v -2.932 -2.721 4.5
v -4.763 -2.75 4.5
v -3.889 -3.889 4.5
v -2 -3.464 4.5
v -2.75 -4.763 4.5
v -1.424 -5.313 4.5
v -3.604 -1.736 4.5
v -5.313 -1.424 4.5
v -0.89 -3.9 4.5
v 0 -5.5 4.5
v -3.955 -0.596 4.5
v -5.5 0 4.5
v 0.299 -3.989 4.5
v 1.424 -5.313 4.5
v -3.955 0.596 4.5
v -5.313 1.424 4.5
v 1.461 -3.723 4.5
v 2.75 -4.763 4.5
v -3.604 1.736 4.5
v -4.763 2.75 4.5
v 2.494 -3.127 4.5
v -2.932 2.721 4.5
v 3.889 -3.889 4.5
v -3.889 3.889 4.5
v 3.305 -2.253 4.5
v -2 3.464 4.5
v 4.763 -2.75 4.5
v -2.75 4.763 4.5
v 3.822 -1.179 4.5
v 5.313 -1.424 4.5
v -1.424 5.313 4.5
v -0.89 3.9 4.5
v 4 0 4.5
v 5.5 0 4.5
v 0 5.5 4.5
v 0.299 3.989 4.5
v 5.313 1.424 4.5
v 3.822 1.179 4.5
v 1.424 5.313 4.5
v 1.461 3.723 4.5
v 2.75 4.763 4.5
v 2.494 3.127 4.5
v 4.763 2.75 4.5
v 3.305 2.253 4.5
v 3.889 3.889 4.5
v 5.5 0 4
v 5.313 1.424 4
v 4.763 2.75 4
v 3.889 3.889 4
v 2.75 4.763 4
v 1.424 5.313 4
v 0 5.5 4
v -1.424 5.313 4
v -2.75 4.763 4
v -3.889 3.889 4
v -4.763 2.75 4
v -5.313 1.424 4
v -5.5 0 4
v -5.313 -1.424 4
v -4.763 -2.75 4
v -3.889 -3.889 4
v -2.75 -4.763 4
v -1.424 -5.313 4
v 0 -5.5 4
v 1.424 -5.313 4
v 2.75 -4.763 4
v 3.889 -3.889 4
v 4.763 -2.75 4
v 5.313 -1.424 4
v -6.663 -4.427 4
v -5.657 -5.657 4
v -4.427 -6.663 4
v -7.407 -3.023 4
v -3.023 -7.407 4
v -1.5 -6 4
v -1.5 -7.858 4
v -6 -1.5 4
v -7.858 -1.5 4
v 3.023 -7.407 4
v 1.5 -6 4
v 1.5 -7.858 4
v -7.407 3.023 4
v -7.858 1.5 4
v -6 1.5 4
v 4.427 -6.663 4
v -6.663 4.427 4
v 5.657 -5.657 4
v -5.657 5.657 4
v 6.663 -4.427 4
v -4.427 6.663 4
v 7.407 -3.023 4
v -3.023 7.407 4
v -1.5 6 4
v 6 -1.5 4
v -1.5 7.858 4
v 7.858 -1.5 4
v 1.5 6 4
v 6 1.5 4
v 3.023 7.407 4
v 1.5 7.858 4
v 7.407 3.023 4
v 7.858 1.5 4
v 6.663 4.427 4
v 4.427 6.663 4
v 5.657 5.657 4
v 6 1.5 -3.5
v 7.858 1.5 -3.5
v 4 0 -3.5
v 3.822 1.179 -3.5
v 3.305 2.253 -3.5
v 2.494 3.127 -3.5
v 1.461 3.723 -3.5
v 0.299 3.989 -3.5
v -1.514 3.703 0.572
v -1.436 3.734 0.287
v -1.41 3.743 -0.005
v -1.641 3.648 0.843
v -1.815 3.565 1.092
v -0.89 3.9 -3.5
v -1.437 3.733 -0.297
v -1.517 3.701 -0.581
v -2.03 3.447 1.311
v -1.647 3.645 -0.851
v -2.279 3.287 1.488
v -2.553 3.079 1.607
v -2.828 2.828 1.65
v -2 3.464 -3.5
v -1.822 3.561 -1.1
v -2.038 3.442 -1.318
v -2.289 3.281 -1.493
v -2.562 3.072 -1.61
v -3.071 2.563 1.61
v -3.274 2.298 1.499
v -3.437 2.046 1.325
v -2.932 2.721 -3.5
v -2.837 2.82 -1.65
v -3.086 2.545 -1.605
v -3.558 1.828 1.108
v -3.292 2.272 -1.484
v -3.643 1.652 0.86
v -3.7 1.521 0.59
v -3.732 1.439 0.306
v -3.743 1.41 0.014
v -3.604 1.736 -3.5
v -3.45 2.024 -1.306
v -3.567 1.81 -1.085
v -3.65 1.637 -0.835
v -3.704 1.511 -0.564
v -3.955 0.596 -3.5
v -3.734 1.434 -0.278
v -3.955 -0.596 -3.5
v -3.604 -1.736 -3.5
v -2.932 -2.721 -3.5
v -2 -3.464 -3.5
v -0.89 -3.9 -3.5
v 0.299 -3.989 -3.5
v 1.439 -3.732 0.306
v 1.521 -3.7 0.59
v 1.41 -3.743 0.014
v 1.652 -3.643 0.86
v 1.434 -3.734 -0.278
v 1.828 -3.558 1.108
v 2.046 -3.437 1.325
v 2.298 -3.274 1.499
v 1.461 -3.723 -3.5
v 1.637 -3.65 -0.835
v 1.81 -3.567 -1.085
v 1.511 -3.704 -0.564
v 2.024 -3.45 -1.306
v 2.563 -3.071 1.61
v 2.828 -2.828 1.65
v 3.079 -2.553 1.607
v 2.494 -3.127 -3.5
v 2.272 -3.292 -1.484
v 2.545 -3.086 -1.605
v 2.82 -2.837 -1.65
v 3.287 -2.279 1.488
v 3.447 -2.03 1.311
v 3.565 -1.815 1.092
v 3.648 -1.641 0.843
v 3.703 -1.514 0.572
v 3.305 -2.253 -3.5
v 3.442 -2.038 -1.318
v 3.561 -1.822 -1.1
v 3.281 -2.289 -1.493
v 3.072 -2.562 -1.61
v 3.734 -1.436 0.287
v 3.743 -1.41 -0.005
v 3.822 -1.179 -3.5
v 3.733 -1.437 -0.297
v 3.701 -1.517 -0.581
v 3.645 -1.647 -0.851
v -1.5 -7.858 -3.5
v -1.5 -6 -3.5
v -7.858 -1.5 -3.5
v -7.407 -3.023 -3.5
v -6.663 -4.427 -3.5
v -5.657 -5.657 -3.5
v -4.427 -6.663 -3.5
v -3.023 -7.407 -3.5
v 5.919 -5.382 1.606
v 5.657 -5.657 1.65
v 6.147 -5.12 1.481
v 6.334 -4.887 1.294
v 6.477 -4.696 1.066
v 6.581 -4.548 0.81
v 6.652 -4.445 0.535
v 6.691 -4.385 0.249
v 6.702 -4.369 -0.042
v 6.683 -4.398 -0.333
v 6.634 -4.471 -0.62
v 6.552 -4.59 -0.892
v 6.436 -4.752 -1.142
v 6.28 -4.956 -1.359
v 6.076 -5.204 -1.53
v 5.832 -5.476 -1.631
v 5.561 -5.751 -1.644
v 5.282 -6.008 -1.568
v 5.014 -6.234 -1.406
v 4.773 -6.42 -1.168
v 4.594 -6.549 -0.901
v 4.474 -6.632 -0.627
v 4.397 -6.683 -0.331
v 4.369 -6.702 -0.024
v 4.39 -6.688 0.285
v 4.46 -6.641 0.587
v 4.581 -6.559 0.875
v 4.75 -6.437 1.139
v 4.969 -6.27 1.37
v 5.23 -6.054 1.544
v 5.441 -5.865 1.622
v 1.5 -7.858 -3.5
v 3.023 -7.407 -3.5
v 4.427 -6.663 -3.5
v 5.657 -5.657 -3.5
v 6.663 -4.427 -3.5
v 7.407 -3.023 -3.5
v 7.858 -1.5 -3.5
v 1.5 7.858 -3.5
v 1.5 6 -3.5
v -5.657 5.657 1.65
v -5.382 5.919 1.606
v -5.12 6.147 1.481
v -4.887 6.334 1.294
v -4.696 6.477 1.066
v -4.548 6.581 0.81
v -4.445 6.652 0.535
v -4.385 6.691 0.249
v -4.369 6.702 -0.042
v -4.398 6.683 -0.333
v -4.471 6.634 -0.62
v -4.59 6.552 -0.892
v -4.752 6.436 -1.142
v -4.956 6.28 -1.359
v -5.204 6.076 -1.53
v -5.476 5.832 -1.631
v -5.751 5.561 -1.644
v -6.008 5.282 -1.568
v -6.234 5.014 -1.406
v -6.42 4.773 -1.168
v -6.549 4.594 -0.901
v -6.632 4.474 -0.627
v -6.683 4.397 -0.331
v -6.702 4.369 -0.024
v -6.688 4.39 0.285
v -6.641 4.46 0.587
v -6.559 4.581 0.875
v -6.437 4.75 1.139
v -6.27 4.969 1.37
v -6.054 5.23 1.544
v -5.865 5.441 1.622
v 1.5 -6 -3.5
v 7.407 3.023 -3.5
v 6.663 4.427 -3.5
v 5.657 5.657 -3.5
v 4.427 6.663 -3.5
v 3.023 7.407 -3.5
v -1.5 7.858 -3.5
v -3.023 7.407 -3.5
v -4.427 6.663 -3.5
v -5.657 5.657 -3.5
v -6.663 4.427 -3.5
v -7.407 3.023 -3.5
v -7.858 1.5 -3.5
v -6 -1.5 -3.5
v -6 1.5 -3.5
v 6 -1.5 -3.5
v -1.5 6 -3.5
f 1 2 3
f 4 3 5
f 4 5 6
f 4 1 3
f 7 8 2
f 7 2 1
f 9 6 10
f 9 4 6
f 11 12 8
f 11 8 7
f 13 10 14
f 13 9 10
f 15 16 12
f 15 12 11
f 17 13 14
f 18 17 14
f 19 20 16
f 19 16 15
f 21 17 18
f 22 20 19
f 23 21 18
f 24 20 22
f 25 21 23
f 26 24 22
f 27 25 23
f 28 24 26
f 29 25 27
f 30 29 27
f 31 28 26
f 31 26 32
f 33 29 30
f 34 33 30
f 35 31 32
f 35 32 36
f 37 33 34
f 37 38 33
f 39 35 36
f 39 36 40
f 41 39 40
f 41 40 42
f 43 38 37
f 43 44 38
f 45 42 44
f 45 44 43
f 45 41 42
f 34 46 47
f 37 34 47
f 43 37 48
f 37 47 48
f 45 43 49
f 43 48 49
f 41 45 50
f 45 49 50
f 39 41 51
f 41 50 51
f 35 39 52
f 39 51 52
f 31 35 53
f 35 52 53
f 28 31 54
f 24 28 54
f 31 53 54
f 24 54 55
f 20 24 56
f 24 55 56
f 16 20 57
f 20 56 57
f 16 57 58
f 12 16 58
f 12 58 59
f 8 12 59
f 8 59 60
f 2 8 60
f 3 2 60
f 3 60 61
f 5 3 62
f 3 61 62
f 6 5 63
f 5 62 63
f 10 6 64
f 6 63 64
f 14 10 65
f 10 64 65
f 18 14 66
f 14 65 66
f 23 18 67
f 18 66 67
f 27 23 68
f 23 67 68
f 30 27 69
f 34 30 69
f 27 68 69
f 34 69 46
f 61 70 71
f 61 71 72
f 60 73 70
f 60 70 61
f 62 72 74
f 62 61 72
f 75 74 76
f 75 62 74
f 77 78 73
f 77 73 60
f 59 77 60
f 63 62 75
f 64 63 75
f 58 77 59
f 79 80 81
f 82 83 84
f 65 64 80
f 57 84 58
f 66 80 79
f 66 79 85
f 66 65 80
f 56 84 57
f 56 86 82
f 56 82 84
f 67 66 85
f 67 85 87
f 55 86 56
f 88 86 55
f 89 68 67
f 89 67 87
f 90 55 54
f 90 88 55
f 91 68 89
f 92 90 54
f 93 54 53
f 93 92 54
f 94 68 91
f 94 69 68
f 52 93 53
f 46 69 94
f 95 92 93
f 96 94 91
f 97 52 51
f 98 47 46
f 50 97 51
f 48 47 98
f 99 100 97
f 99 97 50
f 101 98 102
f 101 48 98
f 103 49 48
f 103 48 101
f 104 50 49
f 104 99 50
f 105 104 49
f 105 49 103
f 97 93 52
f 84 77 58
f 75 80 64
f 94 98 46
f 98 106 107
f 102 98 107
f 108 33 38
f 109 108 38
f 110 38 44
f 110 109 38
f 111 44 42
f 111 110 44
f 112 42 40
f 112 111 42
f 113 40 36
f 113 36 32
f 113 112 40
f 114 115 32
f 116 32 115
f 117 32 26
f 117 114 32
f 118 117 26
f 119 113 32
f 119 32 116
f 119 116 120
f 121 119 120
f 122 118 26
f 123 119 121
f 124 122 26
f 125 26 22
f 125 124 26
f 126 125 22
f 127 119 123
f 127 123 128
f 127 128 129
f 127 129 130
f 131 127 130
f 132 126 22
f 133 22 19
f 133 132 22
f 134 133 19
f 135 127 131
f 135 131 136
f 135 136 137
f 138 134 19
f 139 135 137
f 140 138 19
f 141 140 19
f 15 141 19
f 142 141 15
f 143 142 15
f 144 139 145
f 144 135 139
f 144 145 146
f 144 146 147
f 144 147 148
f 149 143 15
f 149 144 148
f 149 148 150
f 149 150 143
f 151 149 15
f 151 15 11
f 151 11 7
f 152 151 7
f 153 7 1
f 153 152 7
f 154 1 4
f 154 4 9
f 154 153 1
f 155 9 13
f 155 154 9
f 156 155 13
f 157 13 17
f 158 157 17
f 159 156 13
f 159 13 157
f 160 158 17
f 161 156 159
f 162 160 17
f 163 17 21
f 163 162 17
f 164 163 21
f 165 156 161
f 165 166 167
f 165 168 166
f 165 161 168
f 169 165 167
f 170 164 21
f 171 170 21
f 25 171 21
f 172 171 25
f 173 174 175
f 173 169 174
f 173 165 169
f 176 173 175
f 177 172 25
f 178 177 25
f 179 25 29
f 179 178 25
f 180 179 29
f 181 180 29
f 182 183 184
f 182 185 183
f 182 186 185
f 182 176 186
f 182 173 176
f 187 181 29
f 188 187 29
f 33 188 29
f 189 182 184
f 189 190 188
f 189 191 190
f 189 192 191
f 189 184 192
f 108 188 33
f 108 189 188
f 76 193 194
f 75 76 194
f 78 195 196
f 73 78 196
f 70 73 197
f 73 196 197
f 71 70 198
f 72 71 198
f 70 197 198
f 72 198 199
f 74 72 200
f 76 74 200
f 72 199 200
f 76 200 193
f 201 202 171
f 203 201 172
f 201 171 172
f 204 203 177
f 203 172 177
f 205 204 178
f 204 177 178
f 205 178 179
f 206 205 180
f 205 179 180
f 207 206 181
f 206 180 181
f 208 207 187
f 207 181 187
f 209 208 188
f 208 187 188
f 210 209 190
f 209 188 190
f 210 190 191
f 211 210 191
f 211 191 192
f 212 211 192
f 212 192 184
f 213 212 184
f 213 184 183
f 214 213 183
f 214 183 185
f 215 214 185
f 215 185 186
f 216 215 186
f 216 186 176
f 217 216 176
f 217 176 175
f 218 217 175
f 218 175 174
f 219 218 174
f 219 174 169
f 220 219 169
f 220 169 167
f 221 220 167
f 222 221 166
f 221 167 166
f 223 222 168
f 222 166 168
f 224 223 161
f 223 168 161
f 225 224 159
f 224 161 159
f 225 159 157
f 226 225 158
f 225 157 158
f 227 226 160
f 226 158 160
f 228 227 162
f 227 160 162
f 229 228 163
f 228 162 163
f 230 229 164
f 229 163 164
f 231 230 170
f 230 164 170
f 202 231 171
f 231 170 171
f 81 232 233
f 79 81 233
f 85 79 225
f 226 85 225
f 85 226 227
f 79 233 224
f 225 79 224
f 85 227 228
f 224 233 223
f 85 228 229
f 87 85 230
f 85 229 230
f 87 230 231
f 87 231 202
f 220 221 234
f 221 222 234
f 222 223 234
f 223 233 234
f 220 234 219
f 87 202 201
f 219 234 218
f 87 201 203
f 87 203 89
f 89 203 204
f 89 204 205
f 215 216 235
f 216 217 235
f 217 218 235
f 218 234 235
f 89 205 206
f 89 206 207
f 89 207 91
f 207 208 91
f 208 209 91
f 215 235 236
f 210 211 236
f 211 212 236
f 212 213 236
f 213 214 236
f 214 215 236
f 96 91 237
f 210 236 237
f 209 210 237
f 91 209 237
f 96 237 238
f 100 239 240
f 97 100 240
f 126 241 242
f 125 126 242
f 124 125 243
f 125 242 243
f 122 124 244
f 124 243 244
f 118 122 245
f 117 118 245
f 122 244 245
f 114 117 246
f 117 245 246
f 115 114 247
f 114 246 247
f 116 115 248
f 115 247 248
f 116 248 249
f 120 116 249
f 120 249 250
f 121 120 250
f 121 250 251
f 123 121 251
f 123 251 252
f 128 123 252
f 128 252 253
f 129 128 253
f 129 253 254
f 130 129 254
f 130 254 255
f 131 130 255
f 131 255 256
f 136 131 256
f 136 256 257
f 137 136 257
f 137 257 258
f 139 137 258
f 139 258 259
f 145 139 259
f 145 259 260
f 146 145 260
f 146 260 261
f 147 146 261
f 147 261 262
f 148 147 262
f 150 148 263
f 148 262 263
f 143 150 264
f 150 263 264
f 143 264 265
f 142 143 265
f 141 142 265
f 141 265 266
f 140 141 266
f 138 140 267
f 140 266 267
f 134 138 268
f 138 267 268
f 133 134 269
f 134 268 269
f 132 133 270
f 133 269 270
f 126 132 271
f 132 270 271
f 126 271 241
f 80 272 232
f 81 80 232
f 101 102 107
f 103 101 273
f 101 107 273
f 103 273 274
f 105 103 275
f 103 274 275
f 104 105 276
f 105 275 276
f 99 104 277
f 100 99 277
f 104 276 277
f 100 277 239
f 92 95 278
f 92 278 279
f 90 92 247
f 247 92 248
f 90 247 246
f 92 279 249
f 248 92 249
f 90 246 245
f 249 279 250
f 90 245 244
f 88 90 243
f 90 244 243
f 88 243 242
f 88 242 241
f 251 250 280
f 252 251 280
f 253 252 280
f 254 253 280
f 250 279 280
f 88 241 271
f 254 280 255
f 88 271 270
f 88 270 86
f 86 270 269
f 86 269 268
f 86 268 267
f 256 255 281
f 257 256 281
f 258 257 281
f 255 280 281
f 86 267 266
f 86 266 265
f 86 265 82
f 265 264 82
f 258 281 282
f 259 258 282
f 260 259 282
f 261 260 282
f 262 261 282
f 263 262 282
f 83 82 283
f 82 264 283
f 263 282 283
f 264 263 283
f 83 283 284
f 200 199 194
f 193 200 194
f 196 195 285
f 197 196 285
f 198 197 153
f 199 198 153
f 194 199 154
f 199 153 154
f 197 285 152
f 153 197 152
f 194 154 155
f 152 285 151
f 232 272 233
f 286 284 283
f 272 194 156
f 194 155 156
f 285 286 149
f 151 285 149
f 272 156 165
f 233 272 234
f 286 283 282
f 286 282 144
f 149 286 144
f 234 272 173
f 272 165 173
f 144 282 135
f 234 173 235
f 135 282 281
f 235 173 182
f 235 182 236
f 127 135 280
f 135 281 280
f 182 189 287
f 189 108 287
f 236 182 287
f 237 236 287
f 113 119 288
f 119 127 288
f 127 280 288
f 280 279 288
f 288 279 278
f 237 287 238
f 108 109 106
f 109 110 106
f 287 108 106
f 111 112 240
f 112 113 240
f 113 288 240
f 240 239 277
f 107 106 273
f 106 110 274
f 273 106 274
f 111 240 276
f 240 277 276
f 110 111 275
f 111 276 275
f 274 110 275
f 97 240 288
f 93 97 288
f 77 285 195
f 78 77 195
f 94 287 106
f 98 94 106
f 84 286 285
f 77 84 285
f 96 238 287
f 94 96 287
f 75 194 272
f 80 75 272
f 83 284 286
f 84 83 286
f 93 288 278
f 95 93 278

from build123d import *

# Parameters (mm, degrees)
EXTRUDE_START          = -3.5
SKETCH_1_R             = 8
SKETCH_1_R_2           = 4
EXTRUDE_1_DEPTH        = 7.5
SKETCH_2_R             = 5.5
SKETCH_2_R_2           = 4
EXTRUDE_2_DEPTH        = 0.5
CUT_EXTRUDE_1_DEPTH    = 7.5
HOLE_WIZARD_M4_1_D     = 3.3
HOLE_WIZARD_M4_1_DEPTH = 17.5
HOLE_WIZARD_M4_1_TIP   = 0.991420021


with BuildPart() as part:
    # 草图1 → 凸台-拉伸1 (new body)
    with BuildSketch(Plane.XY.offset(EXTRUDE_START)):
        Circle(SKETCH_1_R)
        Circle(SKETCH_1_R_2, mode=Mode.SUBTRACT)
    extrude(amount=EXTRUDE_1_DEPTH)

    # 草图2 → 凸台-拉伸2 (add)
    with BuildSketch(Plane.XY.offset(4)):
        Circle(SKETCH_2_R)
        Circle(SKETCH_2_R_2, mode=Mode.SUBTRACT)
    extrude(amount=EXTRUDE_2_DEPTH)

    # 草图3 → 切除-拉伸1 (cut)
    with BuildSketch(Plane(origin=(0, 0, -3.5), x_dir=(-1, 0, 0), z_dir=(0, 0, -1))):
        with BuildLine():
            Line((-7.858116823, -1.5), (-6, -1.5))
            Line((-6, -1.5), (-6, 1.5))
            Line((-6, 1.5), (-7.858116823, 1.5))
            ThreePointArc((-7.858116823, 1.5), (-8, 0), (-7.858116823, -1.5))
        make_face()
        with BuildLine():
            Line((1.5, -7.858116823), (1.5, -6))
            Line((1.5, -6), (-1.5, -6))
            Line((-1.5, -6), (-1.5, -7.858116823))
            ThreePointArc((-1.5, -7.858116823), (0, -8), (1.5, -7.858116823))
        make_face()
        with BuildLine():
            Line((-1.5, 6), (1.5, 6))
            Line((1.5, 6), (1.5, 7.858116823))
            ThreePointArc((1.5, 7.858116823), (0, 8), (-1.5, 7.858116823))
            Line((-1.5, 7.858116823), (-1.5, 6))
        make_face()
        with BuildLine():
            Line((6, -1.5), (7.858116823, -1.5))
            ThreePointArc((7.858116823, -1.5), (8, 0), (7.858116823, 1.5))
            Line((7.858116823, 1.5), (6, 1.5))
            Line((6, 1.5), (6, -1.5))
        make_face()
    extrude(amount=-CUT_EXTRUDE_1_DEPTH, mode=Mode.SUBTRACT)

    # M4 螺纹孔1
    with Locations(Plane(origin=(5.656854249, -5.656854249, 0), x_dir=(0, 0, -1), z_dir=(0.7071067811865464, -0.7071067811865488, 0))):
        with Locations((0, 0)):
            Hole(HOLE_WIZARD_M4_1_D / 2, depth=HOLE_WIZARD_M4_1_DEPTH)
            with Locations((0, 0, -(HOLE_WIZARD_M4_1_DEPTH + HOLE_WIZARD_M4_1_TIP / 2))):  # 118° drill point
                Cone(0, HOLE_WIZARD_M4_1_D / 2, HOLE_WIZARD_M4_1_TIP, mode=Mode.SUBTRACT)


solid = part.part
